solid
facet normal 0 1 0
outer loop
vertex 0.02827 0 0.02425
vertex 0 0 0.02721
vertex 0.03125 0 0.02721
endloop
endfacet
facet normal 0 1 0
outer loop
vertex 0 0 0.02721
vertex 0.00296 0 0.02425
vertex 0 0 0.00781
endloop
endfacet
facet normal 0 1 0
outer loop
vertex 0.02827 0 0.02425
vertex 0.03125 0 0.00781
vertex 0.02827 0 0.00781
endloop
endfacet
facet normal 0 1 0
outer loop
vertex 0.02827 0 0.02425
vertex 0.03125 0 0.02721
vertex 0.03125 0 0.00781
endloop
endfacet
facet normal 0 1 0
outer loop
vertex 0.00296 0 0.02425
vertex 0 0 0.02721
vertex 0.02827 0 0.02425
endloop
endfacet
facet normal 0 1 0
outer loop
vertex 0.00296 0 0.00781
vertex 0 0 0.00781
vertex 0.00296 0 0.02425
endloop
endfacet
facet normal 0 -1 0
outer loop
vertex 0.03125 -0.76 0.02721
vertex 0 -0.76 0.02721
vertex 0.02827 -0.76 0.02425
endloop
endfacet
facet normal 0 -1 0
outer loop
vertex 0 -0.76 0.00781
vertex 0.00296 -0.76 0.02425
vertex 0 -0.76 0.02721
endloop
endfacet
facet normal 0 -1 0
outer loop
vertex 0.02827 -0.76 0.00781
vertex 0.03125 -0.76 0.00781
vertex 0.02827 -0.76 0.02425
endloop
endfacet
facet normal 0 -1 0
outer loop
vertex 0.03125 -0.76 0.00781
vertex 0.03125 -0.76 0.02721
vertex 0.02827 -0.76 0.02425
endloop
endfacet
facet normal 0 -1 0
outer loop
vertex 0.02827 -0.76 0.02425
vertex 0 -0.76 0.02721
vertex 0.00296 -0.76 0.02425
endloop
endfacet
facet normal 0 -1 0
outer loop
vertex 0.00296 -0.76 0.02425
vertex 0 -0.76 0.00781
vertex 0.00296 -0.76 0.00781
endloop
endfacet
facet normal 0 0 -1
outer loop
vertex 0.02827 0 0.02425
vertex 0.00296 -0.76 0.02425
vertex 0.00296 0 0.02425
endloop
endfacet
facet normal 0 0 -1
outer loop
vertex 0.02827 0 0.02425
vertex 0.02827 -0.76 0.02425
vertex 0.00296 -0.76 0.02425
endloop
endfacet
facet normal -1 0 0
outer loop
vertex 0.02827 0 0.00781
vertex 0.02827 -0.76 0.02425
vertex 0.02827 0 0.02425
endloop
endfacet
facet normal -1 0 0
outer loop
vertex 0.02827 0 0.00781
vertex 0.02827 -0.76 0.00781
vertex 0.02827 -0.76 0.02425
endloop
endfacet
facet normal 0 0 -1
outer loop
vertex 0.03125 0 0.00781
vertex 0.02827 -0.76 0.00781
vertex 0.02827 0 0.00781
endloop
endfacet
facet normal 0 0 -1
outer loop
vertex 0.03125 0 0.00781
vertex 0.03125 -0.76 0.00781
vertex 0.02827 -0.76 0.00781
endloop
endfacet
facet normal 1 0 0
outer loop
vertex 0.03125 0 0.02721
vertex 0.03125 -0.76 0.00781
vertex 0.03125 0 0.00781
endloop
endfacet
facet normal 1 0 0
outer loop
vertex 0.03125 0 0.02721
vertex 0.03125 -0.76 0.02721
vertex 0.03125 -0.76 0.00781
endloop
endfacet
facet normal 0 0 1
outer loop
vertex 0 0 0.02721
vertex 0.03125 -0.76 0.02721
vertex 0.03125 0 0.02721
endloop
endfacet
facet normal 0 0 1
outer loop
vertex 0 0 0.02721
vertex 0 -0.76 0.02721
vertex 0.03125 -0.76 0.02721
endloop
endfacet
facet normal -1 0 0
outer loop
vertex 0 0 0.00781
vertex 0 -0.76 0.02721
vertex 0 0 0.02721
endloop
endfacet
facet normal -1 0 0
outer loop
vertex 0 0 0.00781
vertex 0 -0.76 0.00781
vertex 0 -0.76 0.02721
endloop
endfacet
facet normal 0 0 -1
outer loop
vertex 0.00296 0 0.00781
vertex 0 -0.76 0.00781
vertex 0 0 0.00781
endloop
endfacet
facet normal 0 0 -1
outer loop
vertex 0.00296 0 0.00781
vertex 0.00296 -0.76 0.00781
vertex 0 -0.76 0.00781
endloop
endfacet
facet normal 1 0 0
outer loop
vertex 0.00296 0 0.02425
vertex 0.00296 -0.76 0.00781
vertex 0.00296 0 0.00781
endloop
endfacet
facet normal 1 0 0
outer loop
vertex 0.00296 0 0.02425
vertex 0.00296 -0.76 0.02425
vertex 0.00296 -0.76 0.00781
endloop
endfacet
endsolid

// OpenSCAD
EPS = 0.01;

translate([0, 0, 0.0078125])
rotate([90, 0, 0])
linear_extrude(height=0.75 + EPS)
    polygon(points=[
        [0.0029605263157894738, 0.0],
        [0.0029605263157894738, 0.01644736842105263],
        [0.028289473684210524, 0.01644736842105263],
        [0.028289473684210524, 0.0],
        [0.03125, 0.0],
        [0.03125, 0.019407894736842103],
        [0.0, 0.019407894736842103],
        [0.0, 0.0]
    ]);
